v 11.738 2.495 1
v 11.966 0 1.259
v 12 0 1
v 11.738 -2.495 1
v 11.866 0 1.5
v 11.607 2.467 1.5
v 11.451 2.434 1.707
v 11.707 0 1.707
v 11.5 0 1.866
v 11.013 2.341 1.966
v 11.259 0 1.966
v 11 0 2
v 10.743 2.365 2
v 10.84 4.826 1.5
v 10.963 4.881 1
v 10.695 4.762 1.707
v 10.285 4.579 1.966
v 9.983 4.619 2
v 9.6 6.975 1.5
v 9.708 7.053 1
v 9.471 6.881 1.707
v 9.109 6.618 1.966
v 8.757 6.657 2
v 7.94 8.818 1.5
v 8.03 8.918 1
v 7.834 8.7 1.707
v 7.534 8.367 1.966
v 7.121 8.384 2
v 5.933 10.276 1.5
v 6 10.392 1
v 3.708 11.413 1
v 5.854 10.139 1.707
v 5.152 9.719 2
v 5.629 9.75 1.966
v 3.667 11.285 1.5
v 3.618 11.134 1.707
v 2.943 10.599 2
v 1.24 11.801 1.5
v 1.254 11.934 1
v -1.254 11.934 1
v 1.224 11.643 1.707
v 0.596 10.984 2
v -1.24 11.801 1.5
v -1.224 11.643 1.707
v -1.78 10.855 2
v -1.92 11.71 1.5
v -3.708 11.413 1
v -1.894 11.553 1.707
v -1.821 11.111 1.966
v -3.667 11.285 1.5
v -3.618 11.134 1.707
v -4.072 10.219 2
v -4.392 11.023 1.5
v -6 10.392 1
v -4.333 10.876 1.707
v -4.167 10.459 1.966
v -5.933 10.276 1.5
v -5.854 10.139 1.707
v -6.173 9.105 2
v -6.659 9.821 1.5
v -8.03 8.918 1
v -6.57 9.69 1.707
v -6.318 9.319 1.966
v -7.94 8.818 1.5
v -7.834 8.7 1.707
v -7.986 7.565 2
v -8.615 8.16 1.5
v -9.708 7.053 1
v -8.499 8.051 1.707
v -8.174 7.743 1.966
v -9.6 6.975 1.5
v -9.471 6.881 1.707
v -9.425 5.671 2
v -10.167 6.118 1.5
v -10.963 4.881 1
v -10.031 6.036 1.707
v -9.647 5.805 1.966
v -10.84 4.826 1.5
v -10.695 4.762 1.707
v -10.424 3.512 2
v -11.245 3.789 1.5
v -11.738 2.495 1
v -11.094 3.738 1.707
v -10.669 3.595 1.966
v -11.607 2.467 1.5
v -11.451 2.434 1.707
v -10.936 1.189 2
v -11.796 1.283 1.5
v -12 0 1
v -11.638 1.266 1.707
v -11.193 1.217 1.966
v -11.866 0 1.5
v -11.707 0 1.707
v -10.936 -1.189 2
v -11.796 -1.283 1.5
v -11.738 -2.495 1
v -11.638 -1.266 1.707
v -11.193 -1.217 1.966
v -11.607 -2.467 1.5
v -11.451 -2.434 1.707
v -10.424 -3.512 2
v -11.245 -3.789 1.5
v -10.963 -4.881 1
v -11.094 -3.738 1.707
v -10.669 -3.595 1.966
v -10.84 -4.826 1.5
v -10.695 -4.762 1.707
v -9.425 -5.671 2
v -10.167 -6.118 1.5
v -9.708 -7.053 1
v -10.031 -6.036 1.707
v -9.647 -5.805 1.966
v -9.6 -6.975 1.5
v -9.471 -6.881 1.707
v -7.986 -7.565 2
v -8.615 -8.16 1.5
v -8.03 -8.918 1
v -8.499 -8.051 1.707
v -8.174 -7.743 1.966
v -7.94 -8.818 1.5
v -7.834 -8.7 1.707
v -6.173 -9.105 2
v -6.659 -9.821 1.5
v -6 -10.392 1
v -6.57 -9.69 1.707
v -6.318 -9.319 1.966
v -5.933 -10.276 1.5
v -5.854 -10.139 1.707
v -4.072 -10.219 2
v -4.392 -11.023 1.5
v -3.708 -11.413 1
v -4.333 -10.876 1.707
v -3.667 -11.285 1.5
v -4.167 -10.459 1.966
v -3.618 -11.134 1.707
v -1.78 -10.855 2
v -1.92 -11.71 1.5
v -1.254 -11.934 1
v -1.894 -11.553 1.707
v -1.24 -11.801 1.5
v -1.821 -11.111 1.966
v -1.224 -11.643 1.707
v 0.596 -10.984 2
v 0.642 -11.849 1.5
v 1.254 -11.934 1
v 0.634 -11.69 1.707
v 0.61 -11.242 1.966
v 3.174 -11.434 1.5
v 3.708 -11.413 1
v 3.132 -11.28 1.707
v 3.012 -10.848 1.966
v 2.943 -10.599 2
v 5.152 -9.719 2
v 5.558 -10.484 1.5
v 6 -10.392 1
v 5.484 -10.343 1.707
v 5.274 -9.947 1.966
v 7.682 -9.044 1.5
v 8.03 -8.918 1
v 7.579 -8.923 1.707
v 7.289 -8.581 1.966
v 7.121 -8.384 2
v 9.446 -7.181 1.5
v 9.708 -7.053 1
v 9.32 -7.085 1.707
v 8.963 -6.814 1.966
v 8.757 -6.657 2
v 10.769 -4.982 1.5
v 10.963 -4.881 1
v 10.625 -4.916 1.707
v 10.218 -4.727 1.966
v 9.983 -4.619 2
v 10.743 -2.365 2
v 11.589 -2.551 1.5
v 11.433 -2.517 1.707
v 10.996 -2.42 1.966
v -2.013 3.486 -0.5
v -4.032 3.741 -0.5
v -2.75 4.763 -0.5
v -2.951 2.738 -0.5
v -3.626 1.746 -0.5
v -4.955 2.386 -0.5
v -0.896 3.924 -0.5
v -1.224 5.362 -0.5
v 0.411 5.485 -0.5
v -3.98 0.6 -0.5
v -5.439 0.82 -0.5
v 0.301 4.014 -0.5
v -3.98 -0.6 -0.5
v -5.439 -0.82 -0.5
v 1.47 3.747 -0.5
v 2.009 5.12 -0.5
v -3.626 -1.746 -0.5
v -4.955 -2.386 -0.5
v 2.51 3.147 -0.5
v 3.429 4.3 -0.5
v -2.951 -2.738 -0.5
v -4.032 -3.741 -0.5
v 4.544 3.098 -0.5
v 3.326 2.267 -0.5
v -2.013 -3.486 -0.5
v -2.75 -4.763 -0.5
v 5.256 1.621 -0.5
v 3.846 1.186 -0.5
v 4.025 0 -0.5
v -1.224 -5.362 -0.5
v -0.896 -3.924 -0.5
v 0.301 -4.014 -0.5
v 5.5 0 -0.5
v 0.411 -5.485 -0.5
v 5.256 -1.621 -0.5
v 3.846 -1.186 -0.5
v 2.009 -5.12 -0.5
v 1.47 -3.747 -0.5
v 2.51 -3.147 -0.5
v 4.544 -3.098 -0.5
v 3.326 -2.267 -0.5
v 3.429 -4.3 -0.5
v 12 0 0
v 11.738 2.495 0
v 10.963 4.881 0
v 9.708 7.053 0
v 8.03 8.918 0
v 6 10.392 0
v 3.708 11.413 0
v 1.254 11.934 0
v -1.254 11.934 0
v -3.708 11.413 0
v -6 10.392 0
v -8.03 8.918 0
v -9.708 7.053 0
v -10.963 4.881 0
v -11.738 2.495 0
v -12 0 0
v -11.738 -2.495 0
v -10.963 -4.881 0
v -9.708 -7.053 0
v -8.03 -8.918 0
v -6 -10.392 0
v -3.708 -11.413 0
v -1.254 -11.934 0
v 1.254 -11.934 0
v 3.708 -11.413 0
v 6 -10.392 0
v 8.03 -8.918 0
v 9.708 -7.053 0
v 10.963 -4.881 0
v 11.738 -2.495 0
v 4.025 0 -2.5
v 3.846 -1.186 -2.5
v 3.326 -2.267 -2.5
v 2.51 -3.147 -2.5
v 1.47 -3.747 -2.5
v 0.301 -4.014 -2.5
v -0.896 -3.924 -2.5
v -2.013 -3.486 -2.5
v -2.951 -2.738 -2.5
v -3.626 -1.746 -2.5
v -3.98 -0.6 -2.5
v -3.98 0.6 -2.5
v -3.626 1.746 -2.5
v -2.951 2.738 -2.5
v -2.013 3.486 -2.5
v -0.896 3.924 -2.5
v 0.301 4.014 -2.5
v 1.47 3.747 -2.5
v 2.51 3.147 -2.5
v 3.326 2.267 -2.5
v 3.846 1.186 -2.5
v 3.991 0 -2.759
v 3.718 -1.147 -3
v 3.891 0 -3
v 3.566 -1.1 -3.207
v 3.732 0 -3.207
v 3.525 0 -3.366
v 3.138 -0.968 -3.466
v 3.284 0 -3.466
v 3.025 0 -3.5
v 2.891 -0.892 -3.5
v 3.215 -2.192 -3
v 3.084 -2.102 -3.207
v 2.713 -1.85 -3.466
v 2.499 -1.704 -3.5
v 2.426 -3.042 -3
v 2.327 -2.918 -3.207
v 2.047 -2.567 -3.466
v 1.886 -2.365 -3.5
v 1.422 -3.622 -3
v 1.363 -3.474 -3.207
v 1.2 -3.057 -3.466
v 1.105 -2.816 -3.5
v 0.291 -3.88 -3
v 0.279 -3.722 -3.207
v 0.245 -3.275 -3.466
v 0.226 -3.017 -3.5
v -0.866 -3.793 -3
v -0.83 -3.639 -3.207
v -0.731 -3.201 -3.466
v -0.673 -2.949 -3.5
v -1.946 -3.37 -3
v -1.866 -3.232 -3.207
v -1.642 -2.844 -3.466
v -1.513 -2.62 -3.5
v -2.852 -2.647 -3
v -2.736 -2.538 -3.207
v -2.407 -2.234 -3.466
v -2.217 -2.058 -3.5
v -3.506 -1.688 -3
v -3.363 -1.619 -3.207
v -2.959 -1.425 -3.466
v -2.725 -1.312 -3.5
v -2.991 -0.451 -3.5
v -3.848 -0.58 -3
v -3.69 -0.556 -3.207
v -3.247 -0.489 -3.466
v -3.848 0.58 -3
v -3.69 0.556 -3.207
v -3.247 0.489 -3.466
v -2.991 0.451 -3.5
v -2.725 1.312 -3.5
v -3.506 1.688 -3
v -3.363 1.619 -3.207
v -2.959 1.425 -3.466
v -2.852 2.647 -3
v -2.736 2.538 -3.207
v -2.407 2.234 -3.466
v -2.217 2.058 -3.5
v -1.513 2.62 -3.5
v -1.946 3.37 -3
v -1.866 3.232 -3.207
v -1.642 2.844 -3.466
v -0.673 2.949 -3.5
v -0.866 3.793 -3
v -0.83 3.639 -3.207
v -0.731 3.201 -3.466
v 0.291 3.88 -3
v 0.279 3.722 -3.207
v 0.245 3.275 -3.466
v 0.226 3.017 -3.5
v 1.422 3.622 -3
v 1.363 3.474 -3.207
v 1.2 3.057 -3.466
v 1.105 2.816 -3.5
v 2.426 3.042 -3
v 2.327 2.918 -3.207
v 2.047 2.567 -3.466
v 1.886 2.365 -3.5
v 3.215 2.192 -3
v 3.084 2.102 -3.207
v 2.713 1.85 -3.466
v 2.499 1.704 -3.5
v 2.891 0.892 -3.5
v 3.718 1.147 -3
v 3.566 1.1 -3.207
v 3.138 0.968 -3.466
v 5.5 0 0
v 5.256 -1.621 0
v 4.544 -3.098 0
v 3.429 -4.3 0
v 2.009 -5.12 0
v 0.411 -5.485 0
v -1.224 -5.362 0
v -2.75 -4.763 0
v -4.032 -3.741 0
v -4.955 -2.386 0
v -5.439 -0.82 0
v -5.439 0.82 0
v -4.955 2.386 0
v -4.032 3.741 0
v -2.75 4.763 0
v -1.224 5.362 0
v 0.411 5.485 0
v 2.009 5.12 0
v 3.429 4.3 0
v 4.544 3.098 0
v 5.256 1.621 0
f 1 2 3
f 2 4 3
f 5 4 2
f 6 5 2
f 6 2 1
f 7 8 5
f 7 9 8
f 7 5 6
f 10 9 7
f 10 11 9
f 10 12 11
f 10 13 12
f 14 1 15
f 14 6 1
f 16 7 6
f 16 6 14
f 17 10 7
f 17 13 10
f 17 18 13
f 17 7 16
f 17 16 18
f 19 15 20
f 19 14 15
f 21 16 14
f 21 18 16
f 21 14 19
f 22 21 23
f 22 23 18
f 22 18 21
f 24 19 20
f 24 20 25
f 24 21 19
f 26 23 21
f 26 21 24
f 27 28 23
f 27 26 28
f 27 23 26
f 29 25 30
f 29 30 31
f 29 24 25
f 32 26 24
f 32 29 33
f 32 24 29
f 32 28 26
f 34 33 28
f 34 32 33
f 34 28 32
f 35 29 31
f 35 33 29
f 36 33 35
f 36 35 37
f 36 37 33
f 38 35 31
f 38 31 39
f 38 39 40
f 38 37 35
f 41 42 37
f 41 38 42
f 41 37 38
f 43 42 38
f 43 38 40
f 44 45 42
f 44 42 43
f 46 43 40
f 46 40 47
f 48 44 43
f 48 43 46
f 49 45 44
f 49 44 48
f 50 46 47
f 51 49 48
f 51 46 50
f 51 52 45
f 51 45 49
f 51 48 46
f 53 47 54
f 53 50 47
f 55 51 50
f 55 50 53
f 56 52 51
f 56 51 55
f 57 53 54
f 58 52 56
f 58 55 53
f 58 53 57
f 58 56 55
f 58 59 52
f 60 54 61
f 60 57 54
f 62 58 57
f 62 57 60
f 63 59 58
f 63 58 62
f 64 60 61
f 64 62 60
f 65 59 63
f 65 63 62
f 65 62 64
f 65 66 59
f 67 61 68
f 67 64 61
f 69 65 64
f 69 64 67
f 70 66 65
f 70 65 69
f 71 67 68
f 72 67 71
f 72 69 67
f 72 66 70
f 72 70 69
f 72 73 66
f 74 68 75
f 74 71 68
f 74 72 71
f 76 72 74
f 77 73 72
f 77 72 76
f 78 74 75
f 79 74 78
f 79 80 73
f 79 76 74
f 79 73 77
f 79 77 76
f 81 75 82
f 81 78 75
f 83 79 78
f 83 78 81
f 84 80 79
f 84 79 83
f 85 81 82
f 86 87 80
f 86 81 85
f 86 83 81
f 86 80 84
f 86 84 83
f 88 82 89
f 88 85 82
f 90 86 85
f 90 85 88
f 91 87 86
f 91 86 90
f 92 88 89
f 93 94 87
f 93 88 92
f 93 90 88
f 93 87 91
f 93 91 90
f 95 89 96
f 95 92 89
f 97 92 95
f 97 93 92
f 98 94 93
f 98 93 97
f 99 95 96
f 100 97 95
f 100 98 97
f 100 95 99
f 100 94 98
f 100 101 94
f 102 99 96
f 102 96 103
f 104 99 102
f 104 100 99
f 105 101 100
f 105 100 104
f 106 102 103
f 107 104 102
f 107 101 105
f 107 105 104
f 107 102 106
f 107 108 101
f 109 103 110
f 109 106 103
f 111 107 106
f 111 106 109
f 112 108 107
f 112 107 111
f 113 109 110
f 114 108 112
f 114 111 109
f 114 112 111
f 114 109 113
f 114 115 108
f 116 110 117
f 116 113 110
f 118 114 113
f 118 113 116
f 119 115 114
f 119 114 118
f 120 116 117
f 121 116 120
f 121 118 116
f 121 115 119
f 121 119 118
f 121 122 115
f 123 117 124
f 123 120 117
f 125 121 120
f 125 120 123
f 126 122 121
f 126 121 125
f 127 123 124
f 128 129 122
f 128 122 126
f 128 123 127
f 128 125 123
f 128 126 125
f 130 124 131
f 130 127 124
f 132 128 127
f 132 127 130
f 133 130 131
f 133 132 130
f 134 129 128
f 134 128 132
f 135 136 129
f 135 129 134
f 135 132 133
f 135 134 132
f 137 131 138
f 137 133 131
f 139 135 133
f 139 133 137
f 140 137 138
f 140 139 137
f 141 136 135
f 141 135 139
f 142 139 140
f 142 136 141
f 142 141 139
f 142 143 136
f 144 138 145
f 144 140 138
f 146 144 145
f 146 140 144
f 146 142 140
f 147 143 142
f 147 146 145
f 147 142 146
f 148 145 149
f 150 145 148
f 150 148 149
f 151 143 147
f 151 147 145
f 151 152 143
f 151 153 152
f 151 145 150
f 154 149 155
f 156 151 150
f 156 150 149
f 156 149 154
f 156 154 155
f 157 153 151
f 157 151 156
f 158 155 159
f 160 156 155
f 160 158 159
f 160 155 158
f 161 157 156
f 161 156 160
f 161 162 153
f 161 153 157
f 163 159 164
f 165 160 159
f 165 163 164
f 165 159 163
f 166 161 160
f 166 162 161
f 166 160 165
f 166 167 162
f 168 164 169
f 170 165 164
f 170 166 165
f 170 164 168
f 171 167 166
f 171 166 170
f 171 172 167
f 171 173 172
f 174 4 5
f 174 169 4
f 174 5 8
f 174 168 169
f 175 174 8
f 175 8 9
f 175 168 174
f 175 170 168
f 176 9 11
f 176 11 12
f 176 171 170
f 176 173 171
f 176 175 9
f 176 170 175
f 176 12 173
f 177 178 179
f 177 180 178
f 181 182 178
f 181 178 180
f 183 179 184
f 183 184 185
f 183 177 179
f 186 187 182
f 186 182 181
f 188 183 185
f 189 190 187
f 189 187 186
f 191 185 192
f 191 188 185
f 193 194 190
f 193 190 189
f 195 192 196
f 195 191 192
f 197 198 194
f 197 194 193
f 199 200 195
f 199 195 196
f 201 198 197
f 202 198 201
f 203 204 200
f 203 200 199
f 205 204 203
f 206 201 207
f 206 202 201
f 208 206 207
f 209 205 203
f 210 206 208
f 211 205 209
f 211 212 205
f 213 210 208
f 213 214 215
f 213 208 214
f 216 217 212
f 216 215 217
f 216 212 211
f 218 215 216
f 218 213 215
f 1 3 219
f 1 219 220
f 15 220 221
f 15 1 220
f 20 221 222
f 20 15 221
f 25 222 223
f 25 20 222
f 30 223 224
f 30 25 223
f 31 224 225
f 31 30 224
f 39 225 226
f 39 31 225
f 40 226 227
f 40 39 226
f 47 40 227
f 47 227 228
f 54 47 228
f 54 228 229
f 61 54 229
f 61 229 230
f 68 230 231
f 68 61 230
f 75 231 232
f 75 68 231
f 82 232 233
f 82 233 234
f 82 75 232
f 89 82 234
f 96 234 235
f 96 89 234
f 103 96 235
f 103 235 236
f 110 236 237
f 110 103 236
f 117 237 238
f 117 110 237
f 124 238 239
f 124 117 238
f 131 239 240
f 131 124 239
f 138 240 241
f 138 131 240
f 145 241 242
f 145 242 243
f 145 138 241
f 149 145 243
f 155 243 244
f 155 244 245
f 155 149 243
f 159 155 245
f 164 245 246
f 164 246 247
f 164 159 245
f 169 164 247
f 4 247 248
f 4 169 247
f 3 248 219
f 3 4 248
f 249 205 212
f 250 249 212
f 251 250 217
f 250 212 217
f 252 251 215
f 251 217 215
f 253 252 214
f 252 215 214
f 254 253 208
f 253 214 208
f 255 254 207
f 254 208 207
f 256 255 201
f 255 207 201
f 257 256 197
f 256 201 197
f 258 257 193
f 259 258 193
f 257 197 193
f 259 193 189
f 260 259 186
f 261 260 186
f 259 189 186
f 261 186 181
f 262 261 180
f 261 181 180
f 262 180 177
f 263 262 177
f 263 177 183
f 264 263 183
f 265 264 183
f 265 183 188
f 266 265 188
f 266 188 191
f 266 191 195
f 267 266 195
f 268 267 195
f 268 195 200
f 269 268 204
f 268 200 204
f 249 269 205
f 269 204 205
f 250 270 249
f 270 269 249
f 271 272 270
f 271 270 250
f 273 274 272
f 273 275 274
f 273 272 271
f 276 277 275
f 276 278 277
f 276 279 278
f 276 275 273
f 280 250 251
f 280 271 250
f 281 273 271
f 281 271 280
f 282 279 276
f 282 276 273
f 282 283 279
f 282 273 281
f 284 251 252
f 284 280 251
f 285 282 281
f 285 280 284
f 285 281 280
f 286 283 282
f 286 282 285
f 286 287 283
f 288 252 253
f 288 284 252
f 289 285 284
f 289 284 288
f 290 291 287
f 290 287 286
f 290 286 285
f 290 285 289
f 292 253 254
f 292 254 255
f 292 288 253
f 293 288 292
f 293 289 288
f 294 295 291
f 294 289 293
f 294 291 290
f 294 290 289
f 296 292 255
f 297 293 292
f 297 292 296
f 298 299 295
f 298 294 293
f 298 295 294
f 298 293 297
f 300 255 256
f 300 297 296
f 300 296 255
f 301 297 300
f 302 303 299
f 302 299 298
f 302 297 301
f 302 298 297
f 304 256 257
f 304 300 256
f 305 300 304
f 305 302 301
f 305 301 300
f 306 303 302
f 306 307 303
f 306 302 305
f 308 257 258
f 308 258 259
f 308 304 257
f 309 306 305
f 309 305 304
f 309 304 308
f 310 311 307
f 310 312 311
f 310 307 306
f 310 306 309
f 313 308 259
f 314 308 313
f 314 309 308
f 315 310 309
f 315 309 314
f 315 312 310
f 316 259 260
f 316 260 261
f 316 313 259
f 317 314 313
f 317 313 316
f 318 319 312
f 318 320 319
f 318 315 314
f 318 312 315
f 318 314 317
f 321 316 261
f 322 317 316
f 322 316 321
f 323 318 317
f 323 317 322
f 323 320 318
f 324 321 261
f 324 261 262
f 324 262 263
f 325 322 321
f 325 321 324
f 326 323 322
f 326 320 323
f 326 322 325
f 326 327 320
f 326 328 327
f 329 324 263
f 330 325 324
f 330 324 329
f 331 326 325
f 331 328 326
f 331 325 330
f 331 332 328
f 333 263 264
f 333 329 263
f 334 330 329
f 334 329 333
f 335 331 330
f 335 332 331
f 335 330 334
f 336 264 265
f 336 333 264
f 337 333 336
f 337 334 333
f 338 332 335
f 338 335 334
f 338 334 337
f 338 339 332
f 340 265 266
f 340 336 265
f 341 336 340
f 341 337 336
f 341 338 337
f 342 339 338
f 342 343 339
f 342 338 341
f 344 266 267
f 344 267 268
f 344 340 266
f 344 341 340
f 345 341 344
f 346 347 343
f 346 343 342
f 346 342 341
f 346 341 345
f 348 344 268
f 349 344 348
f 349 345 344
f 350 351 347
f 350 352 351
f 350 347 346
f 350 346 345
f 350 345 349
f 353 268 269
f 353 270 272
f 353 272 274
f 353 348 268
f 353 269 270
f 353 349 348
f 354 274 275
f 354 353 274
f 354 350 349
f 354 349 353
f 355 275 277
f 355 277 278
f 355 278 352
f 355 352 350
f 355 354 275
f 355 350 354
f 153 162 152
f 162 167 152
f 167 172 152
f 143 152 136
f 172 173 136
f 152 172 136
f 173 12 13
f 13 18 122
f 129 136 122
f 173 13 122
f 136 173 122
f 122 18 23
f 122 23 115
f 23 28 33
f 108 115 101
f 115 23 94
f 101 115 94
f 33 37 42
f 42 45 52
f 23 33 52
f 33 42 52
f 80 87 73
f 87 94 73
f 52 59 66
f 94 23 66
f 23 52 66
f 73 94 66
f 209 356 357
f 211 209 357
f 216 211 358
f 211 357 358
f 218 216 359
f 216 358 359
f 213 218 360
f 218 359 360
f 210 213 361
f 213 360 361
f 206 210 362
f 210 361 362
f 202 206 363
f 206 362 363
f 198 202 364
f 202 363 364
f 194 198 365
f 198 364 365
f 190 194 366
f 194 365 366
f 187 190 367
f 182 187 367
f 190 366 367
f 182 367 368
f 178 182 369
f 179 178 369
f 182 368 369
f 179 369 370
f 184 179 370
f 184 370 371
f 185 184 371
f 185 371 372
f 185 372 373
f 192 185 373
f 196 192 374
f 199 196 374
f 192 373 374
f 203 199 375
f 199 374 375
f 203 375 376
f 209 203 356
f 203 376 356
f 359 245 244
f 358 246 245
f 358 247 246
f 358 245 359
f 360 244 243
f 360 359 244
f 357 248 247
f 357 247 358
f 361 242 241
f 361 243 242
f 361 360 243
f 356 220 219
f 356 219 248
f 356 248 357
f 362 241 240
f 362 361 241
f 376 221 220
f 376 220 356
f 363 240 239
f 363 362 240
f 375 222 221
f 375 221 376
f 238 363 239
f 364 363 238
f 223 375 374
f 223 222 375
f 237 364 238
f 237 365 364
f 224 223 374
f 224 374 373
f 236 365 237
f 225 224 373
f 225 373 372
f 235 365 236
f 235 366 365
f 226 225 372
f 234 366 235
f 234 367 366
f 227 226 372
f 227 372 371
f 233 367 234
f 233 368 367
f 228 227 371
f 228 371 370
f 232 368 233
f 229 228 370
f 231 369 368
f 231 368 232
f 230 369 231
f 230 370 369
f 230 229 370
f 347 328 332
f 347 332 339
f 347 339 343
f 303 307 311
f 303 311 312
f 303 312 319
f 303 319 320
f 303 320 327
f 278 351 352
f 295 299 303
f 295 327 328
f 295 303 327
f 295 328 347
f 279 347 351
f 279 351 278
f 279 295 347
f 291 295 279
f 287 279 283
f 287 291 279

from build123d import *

# Parameters (mm, degrees)
F0_W     = 12
F0_H     = 2
F2_R     = 1
F3_R     = 5.5
F4_DEPTH = 0.5
F5_R     = 4.025
F6_DEPTH = 3
F7_R     = 1


with BuildPart() as f1:
    # F0 (on Front) → F1 (revolve)
    with BuildSketch(Plane.XZ):
        with Locations((6, 1)):
            Rectangle(F0_W, F0_H)
    revolve(axis=Axis((0, 0, 1), (0, 0, 1)))

    # F2
    f2_edges = [f1.edges().sort_by_distance(p)[0] for p in [
        (-12, 0, 2),
    ]]
    fillet(f2_edges, radius=F2_R)

    # F3 (on face) → F4 (join)
    with BuildSketch(Plane(origin=(0, 0, 0), x_dir=(1, 0, 0), z_dir=(0, 0, -1))):
        Circle(F3_R)
    extrude(amount=F4_DEPTH)

    # F5 (on face) → F6 (join)
    with BuildSketch(Plane(origin=(0, 0, -0.5), x_dir=(1, 0, 0), z_dir=(0, 0, -1))):
        Circle(F5_R)
    extrude(amount=F6_DEPTH)

    # F7
    f7_edges = [f1.edges().sort_by_distance(p)[0] for p in [
        (-4.025, 0, -3.5),
    ]]
    fillet(f7_edges, radius=F7_R)


solid = f1.part
